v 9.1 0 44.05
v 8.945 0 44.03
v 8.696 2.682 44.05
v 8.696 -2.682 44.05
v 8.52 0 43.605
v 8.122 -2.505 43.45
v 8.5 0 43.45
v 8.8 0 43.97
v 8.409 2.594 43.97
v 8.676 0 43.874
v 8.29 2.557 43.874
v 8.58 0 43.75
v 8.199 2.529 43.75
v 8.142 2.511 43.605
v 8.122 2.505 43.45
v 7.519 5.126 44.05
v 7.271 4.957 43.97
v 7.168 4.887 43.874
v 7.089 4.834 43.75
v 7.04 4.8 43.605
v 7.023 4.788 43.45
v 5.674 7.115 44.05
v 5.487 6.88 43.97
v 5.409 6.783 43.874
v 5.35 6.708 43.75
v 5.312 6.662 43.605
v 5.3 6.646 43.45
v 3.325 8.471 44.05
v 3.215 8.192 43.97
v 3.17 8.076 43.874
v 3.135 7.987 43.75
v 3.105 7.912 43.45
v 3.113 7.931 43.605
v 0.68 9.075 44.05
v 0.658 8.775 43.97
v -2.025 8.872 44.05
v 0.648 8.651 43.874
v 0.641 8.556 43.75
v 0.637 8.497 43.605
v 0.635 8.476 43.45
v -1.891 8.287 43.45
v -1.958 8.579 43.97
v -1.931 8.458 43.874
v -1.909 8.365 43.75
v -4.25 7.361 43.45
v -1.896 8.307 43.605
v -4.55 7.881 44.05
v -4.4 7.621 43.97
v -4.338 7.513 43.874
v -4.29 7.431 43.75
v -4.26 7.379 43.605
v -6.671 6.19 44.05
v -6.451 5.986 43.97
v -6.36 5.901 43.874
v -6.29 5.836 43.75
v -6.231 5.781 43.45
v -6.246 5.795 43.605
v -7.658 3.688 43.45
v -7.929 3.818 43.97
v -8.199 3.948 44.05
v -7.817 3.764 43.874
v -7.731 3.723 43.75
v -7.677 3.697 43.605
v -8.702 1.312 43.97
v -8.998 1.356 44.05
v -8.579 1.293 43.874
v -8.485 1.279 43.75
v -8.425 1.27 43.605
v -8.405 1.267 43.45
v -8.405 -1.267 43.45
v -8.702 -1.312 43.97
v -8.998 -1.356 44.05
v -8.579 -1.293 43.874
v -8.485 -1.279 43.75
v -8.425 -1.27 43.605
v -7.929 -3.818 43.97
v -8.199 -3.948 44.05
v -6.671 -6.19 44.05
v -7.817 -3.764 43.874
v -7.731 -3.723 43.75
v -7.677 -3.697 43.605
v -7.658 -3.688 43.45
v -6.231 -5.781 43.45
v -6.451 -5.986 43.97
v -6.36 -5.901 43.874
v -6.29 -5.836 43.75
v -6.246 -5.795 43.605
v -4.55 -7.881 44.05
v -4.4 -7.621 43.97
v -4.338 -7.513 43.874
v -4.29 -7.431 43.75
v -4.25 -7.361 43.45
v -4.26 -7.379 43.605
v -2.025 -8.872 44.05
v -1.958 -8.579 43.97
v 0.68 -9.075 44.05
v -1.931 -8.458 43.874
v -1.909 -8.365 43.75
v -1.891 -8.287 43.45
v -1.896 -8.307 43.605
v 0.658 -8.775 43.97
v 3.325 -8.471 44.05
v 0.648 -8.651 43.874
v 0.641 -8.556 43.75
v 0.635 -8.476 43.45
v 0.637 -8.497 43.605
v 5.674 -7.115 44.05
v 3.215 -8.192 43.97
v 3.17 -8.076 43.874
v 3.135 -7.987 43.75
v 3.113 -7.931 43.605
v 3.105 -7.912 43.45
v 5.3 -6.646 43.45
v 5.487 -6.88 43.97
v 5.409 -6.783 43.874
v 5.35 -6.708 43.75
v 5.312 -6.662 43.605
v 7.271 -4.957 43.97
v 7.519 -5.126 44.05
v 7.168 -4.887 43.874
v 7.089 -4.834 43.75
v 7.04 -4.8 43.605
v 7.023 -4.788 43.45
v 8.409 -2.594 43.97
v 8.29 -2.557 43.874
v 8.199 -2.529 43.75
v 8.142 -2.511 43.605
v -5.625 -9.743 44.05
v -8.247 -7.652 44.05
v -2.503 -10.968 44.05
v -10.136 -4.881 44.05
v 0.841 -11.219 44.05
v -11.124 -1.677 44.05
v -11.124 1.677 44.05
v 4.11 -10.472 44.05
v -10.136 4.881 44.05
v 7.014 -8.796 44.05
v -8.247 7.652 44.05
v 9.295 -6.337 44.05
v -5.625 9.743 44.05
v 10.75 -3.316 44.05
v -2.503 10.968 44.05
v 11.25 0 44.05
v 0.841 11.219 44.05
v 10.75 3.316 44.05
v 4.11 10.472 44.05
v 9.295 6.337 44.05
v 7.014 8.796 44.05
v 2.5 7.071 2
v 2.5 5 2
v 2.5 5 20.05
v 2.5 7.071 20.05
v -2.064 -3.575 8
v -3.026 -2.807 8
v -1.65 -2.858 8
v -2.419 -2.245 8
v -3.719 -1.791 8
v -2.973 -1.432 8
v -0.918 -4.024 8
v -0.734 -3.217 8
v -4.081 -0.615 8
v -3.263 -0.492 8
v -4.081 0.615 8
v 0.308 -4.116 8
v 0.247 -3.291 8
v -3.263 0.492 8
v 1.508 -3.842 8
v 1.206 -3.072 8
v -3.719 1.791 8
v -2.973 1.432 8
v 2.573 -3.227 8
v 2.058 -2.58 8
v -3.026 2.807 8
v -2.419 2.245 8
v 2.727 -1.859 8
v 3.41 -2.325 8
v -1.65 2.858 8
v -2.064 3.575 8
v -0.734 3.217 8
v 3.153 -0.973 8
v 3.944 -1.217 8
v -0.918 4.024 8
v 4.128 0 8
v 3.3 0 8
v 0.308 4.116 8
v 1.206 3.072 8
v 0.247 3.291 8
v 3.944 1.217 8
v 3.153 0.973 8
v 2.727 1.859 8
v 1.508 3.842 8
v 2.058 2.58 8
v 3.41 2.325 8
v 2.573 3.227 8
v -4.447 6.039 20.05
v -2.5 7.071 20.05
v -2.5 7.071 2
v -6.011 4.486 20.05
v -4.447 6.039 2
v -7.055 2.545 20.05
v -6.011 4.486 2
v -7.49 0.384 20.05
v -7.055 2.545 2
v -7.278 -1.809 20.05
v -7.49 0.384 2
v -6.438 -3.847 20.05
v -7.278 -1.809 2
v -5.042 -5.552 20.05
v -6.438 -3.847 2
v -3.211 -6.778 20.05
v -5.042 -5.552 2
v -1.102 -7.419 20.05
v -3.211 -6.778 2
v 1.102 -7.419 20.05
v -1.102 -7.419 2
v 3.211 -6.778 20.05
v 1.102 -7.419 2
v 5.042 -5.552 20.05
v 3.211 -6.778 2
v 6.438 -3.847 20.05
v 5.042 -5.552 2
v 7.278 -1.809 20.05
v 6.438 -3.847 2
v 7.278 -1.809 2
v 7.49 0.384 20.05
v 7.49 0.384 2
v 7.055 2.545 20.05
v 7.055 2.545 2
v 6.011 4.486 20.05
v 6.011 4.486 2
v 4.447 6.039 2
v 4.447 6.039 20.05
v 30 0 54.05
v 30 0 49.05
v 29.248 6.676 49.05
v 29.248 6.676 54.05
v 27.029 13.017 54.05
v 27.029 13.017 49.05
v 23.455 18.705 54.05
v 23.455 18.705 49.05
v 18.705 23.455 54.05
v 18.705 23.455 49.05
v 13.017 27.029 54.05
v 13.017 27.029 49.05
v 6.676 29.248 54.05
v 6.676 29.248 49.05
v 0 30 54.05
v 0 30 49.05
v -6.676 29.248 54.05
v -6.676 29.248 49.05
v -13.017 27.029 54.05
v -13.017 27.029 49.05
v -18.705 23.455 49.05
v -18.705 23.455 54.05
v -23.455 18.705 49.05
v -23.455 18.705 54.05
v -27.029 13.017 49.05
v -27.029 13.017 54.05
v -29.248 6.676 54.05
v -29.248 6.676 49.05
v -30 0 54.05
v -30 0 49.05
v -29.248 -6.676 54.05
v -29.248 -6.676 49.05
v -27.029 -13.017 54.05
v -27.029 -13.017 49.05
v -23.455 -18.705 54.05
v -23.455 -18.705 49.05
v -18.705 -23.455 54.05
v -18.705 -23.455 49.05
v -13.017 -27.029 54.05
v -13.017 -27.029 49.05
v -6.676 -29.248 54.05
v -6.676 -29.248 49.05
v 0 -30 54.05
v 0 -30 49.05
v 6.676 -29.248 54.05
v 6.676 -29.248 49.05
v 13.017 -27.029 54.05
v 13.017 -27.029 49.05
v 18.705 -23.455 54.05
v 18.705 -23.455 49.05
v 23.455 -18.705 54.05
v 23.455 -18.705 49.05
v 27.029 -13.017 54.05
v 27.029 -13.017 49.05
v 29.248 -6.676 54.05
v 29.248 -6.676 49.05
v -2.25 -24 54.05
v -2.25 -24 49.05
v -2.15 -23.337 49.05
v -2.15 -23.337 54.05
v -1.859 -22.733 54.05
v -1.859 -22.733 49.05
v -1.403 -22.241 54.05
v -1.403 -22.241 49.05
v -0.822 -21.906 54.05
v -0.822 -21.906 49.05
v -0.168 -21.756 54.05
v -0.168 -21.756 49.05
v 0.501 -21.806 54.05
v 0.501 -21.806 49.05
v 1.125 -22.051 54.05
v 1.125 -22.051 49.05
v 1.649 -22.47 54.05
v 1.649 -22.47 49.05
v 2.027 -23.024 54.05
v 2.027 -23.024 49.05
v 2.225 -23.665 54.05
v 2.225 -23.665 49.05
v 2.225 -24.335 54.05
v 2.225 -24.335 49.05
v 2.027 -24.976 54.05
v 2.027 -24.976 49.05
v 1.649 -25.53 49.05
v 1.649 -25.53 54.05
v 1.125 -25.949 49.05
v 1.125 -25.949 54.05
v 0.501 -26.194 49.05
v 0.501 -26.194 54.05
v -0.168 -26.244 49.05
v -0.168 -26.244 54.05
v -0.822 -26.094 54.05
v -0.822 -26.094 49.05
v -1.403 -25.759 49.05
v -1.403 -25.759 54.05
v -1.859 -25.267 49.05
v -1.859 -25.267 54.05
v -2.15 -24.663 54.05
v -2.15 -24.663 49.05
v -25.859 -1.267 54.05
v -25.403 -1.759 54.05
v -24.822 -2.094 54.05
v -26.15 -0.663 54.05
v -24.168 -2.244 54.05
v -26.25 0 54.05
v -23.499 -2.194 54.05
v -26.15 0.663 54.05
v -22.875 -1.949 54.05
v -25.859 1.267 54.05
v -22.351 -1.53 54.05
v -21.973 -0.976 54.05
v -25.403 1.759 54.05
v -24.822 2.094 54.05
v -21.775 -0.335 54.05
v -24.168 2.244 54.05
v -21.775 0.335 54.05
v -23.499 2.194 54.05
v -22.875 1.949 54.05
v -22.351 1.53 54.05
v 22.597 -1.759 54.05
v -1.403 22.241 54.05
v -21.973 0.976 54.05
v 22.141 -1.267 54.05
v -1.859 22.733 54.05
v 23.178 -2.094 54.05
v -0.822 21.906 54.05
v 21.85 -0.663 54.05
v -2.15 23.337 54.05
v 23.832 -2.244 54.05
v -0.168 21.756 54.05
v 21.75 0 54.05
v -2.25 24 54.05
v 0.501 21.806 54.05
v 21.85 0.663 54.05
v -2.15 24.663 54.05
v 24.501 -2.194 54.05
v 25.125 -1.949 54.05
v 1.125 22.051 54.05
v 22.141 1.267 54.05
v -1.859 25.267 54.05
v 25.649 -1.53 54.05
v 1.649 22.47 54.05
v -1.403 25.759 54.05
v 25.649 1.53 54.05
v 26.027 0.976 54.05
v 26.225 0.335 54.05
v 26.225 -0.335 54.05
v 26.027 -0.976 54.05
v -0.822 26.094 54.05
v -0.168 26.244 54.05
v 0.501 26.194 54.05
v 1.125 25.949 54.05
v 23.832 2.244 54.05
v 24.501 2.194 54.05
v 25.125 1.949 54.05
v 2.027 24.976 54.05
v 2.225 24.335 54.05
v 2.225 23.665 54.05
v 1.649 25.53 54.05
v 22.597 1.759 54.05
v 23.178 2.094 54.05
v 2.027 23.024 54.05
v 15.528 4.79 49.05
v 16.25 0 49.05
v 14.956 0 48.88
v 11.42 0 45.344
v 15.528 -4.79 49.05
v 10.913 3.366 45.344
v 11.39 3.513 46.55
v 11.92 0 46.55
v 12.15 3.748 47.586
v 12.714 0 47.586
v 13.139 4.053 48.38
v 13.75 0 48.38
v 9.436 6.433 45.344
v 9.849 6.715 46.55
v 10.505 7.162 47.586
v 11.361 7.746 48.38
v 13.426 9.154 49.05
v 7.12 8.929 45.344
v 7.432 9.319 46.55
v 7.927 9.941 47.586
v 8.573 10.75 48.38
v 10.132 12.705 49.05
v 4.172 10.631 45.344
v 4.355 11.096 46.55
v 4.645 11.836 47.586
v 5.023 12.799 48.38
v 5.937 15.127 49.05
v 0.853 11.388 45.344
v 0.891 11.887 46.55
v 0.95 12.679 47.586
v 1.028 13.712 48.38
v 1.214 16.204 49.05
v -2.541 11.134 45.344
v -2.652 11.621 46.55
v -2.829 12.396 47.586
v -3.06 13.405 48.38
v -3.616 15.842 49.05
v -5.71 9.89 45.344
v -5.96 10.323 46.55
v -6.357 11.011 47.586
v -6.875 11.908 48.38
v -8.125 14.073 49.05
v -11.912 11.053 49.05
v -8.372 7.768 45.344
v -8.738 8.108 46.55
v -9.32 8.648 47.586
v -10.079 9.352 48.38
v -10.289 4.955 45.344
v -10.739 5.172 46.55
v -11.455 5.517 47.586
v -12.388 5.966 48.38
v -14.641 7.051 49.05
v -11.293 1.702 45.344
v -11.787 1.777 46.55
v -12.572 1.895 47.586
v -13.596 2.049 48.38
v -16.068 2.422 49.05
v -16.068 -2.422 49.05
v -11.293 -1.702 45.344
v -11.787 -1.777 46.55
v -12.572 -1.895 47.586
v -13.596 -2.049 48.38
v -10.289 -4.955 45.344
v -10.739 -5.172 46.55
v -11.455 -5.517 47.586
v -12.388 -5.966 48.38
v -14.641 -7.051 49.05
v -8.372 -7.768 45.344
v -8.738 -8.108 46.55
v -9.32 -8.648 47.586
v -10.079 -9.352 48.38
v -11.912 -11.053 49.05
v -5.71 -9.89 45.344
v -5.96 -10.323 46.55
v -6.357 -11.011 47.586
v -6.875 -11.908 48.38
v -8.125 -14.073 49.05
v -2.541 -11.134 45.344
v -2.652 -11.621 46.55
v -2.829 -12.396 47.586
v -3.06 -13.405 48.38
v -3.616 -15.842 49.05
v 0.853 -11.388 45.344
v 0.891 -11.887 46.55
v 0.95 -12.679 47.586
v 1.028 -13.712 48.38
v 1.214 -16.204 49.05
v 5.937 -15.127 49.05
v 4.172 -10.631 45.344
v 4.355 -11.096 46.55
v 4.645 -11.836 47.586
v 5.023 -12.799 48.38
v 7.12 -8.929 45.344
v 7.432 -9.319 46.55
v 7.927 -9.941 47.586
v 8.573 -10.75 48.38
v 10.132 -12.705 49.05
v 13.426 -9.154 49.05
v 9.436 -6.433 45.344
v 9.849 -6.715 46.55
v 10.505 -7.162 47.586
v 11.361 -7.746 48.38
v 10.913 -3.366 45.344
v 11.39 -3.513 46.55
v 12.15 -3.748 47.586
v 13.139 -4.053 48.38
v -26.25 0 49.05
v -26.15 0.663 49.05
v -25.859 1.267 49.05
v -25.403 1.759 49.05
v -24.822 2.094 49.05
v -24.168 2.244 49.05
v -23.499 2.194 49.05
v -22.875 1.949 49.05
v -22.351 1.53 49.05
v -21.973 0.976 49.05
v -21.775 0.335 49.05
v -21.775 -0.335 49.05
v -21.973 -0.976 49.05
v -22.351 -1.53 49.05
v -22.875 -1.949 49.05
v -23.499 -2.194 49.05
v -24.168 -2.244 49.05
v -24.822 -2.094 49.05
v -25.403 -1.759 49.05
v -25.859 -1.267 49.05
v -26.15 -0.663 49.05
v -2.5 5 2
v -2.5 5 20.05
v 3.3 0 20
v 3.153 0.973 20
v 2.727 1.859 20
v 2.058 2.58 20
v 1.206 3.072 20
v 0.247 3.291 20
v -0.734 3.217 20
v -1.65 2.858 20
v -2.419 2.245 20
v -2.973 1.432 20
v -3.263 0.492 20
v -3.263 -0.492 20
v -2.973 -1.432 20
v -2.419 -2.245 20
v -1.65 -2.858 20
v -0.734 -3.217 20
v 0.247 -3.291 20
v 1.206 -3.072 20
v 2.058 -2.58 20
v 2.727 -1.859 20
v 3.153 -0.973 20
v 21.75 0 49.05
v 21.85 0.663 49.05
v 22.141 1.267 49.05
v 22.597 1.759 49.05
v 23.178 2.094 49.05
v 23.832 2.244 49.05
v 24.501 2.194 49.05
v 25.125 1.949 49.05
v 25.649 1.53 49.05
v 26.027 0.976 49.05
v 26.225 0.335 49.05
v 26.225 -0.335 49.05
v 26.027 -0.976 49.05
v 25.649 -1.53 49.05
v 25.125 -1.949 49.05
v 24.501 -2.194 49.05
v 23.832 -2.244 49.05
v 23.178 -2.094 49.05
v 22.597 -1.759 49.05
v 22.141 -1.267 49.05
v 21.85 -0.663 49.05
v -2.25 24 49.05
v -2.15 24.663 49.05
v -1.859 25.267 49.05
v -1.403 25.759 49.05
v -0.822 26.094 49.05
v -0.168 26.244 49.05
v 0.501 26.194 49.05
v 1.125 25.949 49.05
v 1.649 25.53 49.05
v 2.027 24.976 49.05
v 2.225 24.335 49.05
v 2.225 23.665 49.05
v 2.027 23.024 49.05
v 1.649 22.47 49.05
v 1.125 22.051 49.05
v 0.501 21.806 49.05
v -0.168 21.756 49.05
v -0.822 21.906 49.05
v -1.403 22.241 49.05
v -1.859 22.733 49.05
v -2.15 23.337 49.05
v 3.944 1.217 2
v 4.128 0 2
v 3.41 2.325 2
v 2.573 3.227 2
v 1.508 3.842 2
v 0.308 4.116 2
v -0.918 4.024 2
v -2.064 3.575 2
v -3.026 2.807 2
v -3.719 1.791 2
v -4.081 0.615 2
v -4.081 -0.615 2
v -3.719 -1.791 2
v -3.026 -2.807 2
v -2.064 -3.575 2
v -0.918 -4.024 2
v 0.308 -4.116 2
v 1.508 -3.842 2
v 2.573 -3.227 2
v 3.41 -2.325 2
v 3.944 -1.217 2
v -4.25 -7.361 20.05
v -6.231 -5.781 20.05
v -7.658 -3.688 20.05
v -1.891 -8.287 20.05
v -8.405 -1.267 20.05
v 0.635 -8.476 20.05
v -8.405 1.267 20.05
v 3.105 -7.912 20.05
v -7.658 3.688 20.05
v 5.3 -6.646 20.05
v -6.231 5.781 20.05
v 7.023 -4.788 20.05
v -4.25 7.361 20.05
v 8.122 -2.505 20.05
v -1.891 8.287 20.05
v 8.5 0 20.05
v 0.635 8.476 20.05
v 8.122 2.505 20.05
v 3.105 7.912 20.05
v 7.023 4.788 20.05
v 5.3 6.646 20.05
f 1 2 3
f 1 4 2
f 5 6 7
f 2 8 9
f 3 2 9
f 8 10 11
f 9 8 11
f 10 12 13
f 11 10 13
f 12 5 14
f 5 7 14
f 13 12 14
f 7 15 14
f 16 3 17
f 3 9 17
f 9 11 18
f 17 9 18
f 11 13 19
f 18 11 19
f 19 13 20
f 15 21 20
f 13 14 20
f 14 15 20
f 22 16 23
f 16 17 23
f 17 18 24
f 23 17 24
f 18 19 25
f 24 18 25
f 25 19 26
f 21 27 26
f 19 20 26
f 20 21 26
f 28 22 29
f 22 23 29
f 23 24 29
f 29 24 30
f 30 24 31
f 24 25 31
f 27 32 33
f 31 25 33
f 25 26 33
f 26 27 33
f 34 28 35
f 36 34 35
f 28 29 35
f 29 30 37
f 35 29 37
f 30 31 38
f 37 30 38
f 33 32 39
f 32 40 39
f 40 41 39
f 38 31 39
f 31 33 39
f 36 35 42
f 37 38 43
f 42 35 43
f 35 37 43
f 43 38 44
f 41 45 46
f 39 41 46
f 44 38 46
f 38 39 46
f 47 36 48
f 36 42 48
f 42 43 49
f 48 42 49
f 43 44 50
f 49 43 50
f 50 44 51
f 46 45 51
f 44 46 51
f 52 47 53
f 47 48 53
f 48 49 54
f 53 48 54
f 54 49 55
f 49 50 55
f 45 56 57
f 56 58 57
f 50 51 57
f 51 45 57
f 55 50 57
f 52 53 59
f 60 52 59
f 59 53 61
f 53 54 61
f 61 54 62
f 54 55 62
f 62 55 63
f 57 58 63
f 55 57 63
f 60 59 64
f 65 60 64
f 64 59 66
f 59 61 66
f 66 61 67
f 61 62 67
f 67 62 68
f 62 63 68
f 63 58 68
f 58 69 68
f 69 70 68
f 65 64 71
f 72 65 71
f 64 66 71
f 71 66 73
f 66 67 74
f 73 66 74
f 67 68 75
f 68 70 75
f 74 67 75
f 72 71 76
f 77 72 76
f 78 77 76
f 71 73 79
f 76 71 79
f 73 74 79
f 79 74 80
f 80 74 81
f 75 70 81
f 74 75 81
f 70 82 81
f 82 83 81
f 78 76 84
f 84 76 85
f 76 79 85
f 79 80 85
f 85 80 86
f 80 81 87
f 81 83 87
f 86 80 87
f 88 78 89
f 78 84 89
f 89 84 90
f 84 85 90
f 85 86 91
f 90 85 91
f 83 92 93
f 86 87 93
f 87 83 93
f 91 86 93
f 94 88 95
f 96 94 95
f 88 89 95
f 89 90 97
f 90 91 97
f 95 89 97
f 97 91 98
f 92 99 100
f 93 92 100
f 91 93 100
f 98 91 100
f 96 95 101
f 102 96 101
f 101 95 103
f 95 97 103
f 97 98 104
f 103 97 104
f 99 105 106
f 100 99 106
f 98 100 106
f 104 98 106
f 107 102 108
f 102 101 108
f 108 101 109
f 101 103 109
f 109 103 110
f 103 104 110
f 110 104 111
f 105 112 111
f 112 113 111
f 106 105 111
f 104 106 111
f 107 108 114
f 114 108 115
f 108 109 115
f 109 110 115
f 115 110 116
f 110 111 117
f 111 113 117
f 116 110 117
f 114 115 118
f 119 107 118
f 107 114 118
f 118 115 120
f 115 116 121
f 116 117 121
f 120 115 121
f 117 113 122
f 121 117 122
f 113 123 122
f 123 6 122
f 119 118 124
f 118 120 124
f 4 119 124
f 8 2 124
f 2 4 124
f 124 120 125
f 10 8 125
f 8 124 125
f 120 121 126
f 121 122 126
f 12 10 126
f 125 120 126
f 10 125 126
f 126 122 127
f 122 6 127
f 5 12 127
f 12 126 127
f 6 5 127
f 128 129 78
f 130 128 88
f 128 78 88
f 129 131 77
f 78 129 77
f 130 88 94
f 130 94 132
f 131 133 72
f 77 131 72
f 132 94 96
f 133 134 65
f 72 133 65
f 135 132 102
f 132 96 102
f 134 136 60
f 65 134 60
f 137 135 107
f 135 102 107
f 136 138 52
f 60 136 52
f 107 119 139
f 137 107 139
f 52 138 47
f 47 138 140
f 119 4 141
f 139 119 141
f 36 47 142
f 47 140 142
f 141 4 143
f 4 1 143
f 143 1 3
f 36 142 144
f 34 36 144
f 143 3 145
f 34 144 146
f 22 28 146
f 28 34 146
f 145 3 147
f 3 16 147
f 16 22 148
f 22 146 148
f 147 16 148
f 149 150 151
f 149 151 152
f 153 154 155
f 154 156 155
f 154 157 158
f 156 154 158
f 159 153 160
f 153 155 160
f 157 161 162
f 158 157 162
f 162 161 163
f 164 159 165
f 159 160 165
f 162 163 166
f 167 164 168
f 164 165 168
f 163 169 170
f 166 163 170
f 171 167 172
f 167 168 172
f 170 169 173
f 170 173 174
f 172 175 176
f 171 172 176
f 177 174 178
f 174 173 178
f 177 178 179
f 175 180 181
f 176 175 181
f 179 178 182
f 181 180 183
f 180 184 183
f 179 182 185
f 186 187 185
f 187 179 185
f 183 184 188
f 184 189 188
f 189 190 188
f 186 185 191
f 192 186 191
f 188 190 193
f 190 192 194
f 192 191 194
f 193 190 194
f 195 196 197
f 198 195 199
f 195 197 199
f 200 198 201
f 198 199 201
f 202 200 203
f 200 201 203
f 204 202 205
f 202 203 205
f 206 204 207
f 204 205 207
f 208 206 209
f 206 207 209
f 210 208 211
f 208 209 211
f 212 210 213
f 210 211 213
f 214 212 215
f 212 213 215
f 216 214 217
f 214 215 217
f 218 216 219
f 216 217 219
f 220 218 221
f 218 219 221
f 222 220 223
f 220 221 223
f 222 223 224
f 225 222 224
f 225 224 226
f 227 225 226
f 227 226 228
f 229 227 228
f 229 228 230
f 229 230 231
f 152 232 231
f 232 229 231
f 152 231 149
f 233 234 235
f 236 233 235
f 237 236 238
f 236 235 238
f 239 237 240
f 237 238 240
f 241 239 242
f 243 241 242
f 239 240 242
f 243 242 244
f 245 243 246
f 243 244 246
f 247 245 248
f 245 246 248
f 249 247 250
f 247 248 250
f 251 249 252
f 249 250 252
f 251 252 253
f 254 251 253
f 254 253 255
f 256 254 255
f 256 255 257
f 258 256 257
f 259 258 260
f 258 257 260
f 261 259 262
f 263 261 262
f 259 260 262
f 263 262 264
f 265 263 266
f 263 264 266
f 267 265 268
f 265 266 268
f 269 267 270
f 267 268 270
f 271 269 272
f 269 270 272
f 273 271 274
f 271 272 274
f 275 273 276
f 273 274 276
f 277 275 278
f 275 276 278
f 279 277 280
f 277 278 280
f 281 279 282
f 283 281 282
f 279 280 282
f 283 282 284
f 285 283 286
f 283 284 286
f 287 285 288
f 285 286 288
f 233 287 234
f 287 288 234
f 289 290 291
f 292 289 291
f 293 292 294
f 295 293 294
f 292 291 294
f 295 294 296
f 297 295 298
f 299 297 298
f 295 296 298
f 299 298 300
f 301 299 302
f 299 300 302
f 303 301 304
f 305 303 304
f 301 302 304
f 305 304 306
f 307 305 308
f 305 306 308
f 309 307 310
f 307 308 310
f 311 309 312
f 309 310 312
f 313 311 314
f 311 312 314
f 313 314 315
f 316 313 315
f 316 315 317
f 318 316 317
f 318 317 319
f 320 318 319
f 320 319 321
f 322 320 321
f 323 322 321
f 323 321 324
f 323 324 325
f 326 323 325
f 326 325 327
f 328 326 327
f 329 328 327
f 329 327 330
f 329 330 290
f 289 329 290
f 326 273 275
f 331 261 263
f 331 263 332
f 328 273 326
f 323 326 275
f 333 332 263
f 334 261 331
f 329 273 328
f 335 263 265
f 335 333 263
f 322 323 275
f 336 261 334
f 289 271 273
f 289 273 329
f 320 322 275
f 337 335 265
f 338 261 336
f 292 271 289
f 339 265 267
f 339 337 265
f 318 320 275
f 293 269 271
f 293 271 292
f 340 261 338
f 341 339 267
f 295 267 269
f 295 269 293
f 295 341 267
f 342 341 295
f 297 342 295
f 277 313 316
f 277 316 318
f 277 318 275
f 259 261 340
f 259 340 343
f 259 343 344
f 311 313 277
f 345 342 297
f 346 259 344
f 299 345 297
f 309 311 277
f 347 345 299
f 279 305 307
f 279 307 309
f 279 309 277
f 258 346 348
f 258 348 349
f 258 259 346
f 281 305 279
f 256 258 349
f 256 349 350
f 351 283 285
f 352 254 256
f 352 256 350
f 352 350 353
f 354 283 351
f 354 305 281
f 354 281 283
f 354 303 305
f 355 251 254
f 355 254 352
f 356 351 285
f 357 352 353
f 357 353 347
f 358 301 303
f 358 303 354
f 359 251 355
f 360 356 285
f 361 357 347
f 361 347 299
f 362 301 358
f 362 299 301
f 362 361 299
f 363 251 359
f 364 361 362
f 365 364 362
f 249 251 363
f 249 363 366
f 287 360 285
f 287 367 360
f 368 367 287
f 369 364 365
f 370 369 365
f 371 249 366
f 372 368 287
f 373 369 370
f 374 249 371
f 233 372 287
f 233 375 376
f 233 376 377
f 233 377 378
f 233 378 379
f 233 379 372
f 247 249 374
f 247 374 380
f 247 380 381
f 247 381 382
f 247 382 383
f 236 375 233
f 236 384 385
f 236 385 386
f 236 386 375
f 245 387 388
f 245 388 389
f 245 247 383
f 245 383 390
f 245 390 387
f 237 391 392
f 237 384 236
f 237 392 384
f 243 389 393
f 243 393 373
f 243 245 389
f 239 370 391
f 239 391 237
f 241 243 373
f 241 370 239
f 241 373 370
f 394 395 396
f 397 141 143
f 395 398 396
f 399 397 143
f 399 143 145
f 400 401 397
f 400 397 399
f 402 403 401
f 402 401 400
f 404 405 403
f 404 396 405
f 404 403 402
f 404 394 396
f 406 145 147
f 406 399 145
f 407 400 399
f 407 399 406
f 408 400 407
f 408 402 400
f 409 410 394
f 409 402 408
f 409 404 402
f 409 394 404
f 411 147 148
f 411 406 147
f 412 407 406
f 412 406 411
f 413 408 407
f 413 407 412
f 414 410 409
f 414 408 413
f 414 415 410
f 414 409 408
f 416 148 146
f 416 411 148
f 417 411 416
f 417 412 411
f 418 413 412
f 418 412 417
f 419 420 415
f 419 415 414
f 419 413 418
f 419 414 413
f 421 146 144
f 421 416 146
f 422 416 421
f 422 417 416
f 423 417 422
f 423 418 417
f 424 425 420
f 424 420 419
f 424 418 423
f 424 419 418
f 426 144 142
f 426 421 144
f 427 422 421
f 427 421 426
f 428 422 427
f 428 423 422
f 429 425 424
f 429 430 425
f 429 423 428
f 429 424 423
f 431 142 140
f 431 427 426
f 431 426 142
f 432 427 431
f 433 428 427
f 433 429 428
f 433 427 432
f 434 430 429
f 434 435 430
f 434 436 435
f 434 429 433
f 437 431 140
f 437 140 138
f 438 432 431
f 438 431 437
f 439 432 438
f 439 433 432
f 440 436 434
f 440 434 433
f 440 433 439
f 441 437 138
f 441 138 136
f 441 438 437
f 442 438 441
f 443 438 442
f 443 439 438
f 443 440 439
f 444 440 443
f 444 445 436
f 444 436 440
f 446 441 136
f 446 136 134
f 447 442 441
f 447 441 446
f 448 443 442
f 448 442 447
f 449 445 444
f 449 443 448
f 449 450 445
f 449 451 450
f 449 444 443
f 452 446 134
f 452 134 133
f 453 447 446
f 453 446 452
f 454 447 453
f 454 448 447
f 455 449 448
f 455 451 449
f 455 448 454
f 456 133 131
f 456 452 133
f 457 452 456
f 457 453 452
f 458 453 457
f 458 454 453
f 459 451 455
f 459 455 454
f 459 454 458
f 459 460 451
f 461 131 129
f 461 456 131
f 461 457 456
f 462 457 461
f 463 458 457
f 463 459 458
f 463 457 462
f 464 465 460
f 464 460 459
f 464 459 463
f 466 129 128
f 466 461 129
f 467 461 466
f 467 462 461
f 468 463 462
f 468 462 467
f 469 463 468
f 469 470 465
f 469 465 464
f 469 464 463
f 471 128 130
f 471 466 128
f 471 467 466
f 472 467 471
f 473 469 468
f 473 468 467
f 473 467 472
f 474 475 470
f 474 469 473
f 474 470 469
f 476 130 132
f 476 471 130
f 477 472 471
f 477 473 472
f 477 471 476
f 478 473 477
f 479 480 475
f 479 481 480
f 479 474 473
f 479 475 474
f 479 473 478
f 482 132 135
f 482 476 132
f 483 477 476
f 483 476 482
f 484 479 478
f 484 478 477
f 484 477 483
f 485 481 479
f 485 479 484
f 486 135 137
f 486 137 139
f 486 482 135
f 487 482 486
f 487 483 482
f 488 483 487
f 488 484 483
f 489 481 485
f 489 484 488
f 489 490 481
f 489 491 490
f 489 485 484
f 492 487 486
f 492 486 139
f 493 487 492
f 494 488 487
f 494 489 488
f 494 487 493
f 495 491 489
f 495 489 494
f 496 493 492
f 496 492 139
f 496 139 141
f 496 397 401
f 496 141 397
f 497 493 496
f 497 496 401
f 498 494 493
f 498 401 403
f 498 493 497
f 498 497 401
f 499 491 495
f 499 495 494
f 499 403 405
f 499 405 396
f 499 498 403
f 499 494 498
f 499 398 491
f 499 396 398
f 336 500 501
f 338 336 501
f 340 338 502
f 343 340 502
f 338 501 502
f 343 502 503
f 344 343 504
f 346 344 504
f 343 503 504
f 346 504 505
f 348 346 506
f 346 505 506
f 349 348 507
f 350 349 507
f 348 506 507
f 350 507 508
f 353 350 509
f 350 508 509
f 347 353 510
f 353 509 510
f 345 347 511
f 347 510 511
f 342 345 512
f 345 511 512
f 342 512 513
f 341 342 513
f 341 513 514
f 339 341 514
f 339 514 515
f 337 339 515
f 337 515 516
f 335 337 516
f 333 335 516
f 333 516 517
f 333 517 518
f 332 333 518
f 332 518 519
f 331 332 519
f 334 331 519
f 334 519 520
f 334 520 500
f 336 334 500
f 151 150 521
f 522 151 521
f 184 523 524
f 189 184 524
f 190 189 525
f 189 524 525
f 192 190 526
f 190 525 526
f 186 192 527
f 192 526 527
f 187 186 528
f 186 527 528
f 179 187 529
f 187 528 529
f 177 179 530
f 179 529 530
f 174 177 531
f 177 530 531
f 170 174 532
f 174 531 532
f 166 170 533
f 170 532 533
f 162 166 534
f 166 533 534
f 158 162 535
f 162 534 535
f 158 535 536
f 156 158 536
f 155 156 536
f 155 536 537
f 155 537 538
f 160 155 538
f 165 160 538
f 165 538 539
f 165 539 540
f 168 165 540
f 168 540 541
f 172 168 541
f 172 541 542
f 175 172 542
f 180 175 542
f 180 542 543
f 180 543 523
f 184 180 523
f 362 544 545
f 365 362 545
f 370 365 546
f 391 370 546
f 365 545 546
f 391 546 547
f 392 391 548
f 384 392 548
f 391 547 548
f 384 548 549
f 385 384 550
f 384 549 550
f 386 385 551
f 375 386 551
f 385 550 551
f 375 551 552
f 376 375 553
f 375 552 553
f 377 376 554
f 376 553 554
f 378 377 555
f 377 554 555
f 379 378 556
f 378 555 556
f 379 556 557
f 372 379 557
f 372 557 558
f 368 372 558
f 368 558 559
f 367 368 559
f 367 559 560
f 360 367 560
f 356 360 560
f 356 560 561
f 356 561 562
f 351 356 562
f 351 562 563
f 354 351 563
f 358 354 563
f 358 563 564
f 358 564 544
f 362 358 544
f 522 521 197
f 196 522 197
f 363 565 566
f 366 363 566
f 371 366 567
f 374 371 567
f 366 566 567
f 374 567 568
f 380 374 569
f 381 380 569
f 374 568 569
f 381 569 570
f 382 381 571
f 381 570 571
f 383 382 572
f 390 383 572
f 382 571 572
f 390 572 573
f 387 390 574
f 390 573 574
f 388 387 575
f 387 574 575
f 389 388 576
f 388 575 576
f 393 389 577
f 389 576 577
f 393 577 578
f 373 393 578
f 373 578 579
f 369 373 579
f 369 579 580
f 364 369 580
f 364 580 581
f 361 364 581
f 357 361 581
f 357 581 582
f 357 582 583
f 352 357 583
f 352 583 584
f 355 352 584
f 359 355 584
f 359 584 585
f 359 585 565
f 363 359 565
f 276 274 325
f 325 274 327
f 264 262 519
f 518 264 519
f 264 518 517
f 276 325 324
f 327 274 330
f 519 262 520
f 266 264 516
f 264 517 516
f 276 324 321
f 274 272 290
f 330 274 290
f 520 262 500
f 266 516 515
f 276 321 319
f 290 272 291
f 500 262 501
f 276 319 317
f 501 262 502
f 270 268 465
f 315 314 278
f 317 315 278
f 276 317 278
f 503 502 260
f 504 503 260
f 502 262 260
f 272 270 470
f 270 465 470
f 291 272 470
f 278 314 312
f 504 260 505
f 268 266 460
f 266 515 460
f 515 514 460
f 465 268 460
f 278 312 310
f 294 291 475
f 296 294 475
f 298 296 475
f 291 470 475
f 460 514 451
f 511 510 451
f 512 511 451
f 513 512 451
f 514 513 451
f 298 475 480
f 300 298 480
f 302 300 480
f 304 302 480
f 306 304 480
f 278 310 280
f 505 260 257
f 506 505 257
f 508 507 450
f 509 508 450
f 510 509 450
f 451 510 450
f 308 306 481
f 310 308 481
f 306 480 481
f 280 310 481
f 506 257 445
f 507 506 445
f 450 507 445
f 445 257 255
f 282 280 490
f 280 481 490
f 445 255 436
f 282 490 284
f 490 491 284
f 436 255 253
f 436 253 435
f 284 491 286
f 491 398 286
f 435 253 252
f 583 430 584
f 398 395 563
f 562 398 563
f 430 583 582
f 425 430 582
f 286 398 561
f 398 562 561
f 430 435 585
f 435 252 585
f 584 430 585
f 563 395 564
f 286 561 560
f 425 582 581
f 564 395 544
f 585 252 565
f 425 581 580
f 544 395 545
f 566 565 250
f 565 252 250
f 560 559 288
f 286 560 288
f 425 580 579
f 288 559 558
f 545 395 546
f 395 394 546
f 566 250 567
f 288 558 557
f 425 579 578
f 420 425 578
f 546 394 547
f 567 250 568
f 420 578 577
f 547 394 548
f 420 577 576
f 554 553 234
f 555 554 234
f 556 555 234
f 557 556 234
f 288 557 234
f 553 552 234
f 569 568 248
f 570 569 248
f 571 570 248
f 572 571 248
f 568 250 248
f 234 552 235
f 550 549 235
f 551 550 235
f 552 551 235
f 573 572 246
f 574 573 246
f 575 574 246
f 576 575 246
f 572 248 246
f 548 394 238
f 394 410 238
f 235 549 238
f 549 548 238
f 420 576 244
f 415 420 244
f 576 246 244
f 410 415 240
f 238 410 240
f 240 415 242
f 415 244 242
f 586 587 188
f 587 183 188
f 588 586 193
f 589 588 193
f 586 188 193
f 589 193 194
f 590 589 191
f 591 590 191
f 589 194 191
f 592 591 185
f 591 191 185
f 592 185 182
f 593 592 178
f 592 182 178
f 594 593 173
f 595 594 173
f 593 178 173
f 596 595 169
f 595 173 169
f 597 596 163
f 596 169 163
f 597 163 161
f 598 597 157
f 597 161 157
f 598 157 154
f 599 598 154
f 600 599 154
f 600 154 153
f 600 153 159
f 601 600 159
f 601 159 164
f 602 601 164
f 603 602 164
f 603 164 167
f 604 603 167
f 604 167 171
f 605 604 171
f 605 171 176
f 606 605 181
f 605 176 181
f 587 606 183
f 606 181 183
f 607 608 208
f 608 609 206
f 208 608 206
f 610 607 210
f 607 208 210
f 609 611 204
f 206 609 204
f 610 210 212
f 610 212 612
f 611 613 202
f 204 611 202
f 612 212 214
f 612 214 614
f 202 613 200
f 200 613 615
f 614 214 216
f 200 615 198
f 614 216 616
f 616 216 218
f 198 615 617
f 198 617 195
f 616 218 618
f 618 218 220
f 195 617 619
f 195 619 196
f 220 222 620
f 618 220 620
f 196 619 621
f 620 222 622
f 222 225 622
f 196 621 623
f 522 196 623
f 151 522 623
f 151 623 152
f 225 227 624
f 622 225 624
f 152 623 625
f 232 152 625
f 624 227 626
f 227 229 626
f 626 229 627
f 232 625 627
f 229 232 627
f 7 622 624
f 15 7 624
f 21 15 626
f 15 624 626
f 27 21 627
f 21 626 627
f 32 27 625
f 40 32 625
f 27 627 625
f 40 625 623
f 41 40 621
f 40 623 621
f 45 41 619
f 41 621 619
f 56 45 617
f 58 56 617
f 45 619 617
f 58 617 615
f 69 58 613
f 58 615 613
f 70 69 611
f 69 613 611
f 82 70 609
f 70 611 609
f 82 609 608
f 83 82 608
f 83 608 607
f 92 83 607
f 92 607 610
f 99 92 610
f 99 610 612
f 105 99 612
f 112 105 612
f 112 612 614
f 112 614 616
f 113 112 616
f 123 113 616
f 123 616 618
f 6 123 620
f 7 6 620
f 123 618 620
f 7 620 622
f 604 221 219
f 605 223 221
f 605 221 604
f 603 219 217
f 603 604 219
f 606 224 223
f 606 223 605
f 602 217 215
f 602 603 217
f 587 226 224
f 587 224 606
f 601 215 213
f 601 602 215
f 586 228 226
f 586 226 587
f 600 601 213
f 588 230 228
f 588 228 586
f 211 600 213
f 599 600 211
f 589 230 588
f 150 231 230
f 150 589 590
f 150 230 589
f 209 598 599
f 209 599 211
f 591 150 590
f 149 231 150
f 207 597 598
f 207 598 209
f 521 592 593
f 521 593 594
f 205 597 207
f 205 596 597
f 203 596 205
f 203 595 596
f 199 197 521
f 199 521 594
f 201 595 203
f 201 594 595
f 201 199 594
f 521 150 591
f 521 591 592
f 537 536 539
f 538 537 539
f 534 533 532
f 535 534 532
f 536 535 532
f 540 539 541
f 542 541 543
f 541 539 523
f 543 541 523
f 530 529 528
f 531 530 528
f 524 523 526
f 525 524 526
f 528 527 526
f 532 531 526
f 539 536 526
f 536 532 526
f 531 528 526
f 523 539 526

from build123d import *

# Parameters (mm, degrees)
SKETCH1_R                 = 7.5
BOSS_EXTRUDE1_DEPTH       = 20.05
SKETCH3_W                 = 5
SKETCH3_H                 = 5
CUT_EXTRUDE1_DEPTH        = 21
SKETCH6_R                 = 8.5
BOSS_EXTRUDE2_DEPTH       = 24
SKETCH7_R                 = 11.25
BOSS_EXTRUDE3_DEPTH       = 5
SKETCH8_R                 = 30
BOSS_EXTRUDE4_DEPTH       = 5
FILLET1_R                 = 0.6
FILLET2_R                 = 5
M4_CLEARANCE_HOLE1_D      = 4.5
F_1_0MM_DOWEL_HOLE1_D     = 8.255
F_1_0MM_DOWEL_HOLE1_DEPTH = 8
SKETCH13_R                = 7.5
CUT_EXTRUDE2_DEPTH        = 2
M6_CLEARANCE_HOLE1_D      = 6.6
M6_CLEARANCE_HOLE1_DEPTH  = 12


with BuildPart() as part:
    # Sketch1 → Boss-Extrude1 (new body)
    with BuildSketch(Plane.XY):
        Circle(SKETCH1_R)
    extrude(amount=BOSS_EXTRUDE1_DEPTH)

    # Sketch3 → Cut-Extrude1 (cut)
    with BuildSketch(Plane(origin=(0, 0, 0), x_dir=(-1, 0, 0), z_dir=(0, 0, -1))):
        with Locations((0, 7.5)):
            Rectangle(SKETCH3_W, SKETCH3_H)
    extrude(amount=-CUT_EXTRUDE1_DEPTH, mode=Mode.SUBTRACT)

    # Sketch6 → Boss-Extrude2 (add)
    with BuildSketch(Plane.XY.offset(20.05)):
        Circle(SKETCH6_R)
    extrude(amount=BOSS_EXTRUDE2_DEPTH)

    # Sketch7 → Boss-Extrude3 (add)
    with BuildSketch(Plane.XY.offset(44.05)):
        Circle(SKETCH7_R)
    extrude(amount=BOSS_EXTRUDE3_DEPTH)

    # Sketch8 → Boss-Extrude4 (add)
    with BuildSketch(Plane.XY.offset(49.05)):
        Circle(SKETCH8_R)
    extrude(amount=BOSS_EXTRUDE4_DEPTH)

    # Fillet1
    fillet1_edges = [part.edges().sort_by_distance(p)[0] for p in [
        (-8.5, 0, 44.05),
    ]]
    fillet(fillet1_edges, radius=FILLET1_R)

    # Fillet2
    fillet2_edges = [part.edges().sort_by_distance(p)[0] for p in [
        (-11.25, 0, 49.05),
    ]]
    fillet(fillet2_edges, radius=FILLET2_R - 0.0001)  # a hair under: the kernel refuses the full size

    # M4 Clearance Hole1 (through all)
    with Locations(Plane.XY.offset(54.05)):
        with Locations((0, 24), (0, -24), (24, 0), (-24, 0)):
            Hole(M4_CLEARANCE_HOLE1_D / 2)

    # Ø1.0mm Dowel Hole1
    with Locations(Plane(origin=(0, 0, 0), x_dir=(-1, 0, 0), z_dir=(0, 0, -1))):
        with Locations((0, 0)):
            Hole(F_1_0MM_DOWEL_HOLE1_D / 2, depth=F_1_0MM_DOWEL_HOLE1_DEPTH)

    # Sketch13 → Cut-Extrude2 (cut)
    with BuildSketch(Plane(origin=(0, 0, 0), x_dir=(-1, 0, 0), z_dir=(0, 0, -1))):
        Circle(SKETCH13_R)
    extrude(amount=-CUT_EXTRUDE2_DEPTH, mode=Mode.SUBTRACT)

    # M6 Clearance Hole1
    with Locations(Plane(origin=(0, 0, 8), x_dir=(-1, 0, 0), z_dir=(0, 0, -1))):
        with Locations((0, 0)):
            Hole(M6_CLEARANCE_HOLE1_D / 2, depth=M6_CLEARANCE_HOLE1_DEPTH)


solid = part.part
